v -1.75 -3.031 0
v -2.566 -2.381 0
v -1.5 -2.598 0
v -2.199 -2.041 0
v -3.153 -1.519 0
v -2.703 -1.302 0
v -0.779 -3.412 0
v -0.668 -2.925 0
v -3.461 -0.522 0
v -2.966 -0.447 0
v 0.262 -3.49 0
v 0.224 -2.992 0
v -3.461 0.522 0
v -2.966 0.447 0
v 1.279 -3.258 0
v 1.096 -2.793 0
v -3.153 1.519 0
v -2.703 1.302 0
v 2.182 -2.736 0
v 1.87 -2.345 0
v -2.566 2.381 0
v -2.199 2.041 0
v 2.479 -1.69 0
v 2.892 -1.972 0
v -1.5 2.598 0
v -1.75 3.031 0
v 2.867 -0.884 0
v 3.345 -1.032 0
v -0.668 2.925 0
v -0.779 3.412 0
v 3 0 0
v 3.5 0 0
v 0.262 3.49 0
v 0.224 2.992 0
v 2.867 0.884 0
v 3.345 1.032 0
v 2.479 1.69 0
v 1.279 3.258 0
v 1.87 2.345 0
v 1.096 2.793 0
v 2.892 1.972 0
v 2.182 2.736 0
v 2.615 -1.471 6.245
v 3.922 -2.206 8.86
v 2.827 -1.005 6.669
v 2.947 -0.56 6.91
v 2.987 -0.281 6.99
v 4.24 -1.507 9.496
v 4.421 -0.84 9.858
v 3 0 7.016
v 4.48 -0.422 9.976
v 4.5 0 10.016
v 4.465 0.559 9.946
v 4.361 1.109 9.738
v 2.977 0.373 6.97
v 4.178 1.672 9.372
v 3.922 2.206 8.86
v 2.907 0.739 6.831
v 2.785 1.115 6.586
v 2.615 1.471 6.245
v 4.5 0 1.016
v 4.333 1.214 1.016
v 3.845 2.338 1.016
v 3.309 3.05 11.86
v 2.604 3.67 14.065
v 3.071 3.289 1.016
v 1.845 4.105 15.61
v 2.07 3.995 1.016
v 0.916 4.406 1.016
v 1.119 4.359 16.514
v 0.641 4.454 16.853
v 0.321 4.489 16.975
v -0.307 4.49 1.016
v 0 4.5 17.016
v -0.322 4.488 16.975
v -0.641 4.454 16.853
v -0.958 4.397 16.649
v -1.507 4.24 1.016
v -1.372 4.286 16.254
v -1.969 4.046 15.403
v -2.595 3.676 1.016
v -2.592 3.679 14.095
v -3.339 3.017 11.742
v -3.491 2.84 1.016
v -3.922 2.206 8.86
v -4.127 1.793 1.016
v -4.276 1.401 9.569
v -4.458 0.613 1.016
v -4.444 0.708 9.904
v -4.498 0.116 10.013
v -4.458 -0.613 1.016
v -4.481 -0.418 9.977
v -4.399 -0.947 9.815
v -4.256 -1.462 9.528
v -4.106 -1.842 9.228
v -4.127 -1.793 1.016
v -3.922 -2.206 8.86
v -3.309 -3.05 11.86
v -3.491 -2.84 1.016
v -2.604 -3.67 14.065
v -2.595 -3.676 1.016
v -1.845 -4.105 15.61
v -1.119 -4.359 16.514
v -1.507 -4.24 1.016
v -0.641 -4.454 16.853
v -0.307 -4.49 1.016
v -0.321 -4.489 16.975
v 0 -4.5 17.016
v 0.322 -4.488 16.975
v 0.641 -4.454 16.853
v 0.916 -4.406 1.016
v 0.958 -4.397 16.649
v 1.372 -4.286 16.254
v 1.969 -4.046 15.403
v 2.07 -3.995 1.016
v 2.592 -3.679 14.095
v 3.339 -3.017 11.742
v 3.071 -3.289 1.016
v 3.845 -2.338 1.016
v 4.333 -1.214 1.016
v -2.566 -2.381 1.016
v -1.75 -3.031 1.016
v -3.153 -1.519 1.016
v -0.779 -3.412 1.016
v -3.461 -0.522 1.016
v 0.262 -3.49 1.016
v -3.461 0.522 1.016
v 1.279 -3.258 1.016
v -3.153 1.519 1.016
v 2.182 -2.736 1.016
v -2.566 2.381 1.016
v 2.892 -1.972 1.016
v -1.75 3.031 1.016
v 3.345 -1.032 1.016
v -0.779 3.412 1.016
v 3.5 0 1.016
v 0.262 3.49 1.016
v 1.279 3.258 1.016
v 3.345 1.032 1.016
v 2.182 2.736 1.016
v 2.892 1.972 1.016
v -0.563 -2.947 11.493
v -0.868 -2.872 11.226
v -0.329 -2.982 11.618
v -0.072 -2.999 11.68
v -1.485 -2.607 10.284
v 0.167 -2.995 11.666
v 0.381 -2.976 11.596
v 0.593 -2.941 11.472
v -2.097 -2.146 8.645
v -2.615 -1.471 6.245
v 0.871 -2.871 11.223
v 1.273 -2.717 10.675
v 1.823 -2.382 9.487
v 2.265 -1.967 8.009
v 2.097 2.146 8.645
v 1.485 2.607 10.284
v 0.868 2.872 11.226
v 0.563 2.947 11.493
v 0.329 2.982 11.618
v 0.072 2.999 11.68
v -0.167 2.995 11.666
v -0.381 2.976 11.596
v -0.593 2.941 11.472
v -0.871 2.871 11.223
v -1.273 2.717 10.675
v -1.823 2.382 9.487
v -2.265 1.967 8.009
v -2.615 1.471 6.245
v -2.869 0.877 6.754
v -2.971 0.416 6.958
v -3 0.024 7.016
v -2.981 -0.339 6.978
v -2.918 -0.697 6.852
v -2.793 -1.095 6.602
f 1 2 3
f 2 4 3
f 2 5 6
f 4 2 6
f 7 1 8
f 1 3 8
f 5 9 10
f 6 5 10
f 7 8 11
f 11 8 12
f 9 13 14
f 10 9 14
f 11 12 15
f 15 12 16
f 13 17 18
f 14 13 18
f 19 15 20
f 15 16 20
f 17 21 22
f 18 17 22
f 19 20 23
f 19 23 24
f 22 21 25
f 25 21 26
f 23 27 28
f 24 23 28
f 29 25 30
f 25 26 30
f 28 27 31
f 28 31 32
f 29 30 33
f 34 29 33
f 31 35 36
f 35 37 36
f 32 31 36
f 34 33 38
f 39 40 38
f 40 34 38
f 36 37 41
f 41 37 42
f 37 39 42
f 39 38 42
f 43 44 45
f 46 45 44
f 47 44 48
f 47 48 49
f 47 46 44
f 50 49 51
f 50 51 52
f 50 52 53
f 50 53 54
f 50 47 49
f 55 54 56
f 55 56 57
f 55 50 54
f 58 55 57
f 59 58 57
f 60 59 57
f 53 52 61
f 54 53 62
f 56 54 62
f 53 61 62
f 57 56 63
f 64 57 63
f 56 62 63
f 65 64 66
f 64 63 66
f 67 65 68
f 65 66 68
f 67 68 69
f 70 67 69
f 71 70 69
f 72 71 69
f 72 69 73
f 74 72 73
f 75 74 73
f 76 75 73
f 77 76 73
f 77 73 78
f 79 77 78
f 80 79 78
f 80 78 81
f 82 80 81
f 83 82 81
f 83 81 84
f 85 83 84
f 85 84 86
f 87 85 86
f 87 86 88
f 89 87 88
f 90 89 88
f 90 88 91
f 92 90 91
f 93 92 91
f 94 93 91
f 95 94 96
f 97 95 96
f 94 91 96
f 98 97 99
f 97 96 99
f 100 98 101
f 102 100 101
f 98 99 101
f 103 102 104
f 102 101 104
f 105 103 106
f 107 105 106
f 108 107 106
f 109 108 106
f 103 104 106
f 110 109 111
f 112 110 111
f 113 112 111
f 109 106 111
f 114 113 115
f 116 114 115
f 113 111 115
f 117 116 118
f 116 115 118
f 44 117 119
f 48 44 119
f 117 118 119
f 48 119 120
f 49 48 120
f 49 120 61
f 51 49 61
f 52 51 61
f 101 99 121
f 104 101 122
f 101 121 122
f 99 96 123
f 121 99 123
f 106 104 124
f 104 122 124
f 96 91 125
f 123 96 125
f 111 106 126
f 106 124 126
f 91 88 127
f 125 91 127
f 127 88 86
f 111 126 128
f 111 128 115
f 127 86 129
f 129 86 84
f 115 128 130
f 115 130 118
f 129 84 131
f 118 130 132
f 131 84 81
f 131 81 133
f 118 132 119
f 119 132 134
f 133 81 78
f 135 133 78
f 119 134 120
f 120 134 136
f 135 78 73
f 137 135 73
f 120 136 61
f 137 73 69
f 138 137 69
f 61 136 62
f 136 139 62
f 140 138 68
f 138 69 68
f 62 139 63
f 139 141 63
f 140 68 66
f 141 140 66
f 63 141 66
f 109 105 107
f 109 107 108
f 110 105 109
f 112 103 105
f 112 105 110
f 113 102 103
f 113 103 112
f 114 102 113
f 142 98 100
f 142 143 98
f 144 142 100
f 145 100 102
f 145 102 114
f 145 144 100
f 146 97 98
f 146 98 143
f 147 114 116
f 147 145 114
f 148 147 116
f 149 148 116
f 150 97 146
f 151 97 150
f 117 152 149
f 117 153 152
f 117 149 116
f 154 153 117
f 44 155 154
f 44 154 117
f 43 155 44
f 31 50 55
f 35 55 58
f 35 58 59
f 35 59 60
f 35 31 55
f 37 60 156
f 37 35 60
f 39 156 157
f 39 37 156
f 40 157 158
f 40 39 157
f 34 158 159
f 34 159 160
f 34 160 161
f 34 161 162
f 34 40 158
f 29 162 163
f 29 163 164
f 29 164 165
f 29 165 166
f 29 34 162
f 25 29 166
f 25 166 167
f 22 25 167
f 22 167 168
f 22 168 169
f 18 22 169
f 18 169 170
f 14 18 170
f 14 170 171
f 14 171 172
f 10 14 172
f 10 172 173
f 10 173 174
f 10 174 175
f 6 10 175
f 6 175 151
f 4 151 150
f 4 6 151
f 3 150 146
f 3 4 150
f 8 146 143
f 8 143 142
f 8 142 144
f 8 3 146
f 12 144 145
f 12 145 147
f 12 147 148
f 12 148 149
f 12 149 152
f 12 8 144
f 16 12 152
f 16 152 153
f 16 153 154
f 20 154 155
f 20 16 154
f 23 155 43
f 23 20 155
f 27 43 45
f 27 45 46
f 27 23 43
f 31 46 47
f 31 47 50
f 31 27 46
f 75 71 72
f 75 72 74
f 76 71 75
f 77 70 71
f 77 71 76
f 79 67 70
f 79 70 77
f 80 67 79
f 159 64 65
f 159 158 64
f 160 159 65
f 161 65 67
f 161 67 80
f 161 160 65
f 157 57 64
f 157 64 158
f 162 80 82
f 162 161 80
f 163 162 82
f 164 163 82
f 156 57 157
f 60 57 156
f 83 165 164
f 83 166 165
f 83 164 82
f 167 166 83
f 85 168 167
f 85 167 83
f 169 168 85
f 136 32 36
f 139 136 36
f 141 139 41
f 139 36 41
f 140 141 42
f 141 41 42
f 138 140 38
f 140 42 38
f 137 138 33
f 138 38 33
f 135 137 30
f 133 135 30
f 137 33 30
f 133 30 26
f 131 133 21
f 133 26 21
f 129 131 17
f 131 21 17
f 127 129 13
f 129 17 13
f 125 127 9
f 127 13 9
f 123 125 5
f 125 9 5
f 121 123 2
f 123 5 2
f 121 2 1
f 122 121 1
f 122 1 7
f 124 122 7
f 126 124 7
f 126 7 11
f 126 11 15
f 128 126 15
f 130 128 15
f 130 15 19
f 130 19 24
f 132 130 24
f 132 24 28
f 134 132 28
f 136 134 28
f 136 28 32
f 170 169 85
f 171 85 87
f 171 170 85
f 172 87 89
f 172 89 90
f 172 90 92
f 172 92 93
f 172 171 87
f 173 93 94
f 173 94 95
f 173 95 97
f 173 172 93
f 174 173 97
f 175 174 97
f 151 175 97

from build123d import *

# Parameters (mm, degrees)
F0_R     = 3.5
F0_R_2   = 3
F1_DEPTH = 17.016
F3_R     = 4.5
F3_R_2   = 3.5
F4_DEPTH = 16
F6_W     = 16
F6_H     = 9


with BuildPart() as f1:
    # F0 (on Top) → F1 (new body)
    with BuildSketch(Plane.XY):
        Circle(F0_R)
        Circle(F0_R_2, mode=Mode.SUBTRACT)
    extrude(amount=F1_DEPTH)

    # F3 (on offset) → F4 (join, through all)
    with BuildSketch(Plane.XY.offset(1.016)):
        Circle(F3_R)
        Circle(F3_R_2, mode=Mode.SUBTRACT)
    extrude(amount=F4_DEPTH)

    # F6 (on offset) → F7 section 0
    with BuildSketch(Plane.XY.offset(17.016), mode=Mode.PRIVATE) as f7_s0:
        Rectangle(F6_W, F6_H)
    loft([f7_s0.sketch, Vertex(0, 0, 1.016)], mode=Mode.SUBTRACT)


solid = f1.part
